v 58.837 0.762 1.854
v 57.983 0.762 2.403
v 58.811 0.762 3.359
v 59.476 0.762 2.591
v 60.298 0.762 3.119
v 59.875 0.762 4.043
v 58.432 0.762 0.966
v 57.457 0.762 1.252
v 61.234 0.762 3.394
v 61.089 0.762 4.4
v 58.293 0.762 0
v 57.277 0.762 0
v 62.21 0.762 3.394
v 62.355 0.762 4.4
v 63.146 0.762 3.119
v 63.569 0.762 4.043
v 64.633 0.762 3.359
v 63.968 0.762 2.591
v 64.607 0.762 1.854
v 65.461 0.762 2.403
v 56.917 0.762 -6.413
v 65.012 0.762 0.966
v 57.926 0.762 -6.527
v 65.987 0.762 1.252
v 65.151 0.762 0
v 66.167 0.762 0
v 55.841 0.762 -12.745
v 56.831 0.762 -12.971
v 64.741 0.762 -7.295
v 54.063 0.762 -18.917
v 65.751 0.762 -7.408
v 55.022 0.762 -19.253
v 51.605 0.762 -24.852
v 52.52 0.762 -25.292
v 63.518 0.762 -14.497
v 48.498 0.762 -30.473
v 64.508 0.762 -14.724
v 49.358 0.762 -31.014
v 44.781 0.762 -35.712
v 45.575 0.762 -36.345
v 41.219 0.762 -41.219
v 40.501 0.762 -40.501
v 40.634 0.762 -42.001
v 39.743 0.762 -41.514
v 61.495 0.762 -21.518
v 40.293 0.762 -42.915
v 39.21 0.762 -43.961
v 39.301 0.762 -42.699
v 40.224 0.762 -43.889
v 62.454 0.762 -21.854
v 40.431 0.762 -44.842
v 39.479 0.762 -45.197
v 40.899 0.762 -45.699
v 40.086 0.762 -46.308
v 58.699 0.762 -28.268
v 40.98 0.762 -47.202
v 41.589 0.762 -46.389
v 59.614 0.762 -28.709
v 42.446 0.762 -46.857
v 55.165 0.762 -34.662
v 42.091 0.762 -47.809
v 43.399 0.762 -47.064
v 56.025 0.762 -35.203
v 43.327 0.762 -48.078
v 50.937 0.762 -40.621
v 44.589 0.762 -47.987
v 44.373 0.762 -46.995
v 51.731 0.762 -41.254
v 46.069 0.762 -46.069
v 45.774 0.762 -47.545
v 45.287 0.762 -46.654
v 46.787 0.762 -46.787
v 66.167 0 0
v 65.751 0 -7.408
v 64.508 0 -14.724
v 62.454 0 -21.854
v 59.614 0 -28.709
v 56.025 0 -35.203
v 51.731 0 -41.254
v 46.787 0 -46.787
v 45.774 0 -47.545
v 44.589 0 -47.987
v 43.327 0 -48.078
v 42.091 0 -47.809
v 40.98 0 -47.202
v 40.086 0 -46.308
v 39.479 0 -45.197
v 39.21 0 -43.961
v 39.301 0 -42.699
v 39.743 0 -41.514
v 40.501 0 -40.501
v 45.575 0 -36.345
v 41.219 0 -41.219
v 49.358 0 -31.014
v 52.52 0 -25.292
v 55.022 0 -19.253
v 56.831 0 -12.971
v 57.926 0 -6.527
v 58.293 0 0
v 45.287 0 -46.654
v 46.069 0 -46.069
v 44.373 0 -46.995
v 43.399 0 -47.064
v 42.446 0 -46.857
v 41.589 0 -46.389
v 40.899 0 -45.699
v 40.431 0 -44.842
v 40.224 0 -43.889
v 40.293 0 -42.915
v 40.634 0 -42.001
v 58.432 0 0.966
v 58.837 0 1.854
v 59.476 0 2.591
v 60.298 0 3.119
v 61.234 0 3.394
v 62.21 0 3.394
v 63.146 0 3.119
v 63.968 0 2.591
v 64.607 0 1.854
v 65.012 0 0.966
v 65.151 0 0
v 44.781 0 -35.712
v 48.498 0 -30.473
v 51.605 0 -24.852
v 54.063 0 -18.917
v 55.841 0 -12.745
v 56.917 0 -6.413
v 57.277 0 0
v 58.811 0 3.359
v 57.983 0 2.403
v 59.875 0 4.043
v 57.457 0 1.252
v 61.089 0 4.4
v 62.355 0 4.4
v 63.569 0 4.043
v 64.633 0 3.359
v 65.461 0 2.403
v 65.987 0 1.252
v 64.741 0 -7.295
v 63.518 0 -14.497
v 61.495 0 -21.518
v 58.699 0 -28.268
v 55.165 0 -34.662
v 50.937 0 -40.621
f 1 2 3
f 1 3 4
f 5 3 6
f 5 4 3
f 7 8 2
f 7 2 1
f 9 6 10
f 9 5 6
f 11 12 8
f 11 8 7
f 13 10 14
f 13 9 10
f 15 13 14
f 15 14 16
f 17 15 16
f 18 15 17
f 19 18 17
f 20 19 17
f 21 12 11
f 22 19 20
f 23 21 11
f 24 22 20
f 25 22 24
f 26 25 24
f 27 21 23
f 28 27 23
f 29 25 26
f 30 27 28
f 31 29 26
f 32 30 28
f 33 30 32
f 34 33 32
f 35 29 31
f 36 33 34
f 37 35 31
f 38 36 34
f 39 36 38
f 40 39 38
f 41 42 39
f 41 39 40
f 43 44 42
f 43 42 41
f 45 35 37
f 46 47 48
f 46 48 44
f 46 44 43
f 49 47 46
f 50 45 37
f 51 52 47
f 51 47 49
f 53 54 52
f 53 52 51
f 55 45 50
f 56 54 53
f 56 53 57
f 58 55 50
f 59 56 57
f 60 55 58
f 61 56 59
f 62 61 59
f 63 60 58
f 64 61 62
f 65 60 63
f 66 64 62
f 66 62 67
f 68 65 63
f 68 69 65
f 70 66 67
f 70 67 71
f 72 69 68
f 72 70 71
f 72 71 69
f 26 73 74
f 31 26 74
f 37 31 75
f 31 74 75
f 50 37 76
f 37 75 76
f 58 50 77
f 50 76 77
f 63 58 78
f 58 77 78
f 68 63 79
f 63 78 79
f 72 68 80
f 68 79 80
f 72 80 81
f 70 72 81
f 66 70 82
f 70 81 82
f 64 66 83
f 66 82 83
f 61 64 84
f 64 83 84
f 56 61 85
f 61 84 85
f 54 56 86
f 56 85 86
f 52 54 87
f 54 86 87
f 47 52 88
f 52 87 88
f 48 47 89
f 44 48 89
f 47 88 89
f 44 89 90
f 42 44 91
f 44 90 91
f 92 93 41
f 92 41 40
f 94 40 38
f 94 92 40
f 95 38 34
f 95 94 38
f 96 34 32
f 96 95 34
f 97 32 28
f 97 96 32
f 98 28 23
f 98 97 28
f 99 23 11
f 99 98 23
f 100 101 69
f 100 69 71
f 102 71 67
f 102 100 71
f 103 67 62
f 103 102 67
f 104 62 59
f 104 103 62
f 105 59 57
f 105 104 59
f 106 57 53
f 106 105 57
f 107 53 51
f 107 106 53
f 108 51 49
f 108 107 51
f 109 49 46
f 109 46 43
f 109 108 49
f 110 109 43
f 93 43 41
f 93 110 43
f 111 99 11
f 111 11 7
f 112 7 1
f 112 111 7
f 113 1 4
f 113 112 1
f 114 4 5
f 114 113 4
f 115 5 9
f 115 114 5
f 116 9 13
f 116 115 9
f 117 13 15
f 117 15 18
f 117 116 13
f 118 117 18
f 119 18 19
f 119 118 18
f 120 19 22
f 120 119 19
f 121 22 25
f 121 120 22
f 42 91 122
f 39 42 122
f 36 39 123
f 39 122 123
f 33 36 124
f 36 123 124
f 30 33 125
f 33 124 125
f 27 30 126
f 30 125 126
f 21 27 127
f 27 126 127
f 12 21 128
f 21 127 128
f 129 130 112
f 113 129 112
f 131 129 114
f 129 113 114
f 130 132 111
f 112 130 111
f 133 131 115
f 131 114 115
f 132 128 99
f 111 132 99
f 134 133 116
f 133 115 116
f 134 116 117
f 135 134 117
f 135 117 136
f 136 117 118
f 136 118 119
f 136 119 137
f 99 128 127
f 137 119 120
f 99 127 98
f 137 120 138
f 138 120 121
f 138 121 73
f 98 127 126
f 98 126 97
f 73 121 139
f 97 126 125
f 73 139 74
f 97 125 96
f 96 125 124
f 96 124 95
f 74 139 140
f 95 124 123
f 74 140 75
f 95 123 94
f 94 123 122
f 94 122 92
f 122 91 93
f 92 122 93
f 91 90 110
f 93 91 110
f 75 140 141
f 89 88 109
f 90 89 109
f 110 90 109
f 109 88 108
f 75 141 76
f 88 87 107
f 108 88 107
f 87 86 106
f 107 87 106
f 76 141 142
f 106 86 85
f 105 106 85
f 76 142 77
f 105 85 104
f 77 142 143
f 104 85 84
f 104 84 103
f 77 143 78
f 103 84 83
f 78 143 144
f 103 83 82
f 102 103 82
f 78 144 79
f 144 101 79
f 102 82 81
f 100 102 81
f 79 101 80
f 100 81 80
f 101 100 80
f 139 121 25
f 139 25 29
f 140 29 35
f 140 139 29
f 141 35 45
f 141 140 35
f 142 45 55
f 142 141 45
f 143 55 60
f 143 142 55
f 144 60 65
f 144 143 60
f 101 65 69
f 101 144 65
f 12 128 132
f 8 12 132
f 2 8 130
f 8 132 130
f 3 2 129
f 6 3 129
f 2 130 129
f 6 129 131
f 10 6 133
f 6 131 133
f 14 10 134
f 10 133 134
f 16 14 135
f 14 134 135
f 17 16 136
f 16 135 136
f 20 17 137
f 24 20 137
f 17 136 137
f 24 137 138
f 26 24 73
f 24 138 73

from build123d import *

# Parameters (mm, degrees)
BOSS_EXTRUDE1_DEPTH = 0.762


with BuildPart() as part:
    # Sketch1 → Boss-Extrude1 (new body)
    with BuildSketch(Plane(origin=(0, 0, 0), x_dir=(1, 0, 0), z_dir=(0, 1, 0))):
        with BuildLine():
            ThreePointArc((66.167, 0), (61.130337028, 25.321014669), (46.787134391, 46.787134391))
            ThreePointArc((46.787134391, 46.787134391), (40.500955106, 46.787134391), (40.500955106, 40.500955106))
            ThreePointArc((40.500955106, 40.500955106), (52.917047984, 21.918958956), (57.277, 0))
            ThreePointArc((57.277, 0), (61.722, -4.445), (66.167, 0))
        make_face()
        with BuildLine():
            ThreePointArc((65.151, 0), (60.191675423, 24.932208302), (46.068713901, 46.068713901))
            ThreePointArc((46.068713901, 46.068713901), (41.219375596, 46.068713901), (41.219375596, 41.219375596))
            ThreePointArc((41.219375596, 41.219375596), (53.855709589, 22.307765323), (58.293, 0))
            ThreePointArc((58.293, 0), (61.722, -3.429), (65.151, 0))
        make_face(mode=Mode.SUBTRACT)
    extrude(amount=BOSS_EXTRUDE1_DEPTH)


solid = part.part
